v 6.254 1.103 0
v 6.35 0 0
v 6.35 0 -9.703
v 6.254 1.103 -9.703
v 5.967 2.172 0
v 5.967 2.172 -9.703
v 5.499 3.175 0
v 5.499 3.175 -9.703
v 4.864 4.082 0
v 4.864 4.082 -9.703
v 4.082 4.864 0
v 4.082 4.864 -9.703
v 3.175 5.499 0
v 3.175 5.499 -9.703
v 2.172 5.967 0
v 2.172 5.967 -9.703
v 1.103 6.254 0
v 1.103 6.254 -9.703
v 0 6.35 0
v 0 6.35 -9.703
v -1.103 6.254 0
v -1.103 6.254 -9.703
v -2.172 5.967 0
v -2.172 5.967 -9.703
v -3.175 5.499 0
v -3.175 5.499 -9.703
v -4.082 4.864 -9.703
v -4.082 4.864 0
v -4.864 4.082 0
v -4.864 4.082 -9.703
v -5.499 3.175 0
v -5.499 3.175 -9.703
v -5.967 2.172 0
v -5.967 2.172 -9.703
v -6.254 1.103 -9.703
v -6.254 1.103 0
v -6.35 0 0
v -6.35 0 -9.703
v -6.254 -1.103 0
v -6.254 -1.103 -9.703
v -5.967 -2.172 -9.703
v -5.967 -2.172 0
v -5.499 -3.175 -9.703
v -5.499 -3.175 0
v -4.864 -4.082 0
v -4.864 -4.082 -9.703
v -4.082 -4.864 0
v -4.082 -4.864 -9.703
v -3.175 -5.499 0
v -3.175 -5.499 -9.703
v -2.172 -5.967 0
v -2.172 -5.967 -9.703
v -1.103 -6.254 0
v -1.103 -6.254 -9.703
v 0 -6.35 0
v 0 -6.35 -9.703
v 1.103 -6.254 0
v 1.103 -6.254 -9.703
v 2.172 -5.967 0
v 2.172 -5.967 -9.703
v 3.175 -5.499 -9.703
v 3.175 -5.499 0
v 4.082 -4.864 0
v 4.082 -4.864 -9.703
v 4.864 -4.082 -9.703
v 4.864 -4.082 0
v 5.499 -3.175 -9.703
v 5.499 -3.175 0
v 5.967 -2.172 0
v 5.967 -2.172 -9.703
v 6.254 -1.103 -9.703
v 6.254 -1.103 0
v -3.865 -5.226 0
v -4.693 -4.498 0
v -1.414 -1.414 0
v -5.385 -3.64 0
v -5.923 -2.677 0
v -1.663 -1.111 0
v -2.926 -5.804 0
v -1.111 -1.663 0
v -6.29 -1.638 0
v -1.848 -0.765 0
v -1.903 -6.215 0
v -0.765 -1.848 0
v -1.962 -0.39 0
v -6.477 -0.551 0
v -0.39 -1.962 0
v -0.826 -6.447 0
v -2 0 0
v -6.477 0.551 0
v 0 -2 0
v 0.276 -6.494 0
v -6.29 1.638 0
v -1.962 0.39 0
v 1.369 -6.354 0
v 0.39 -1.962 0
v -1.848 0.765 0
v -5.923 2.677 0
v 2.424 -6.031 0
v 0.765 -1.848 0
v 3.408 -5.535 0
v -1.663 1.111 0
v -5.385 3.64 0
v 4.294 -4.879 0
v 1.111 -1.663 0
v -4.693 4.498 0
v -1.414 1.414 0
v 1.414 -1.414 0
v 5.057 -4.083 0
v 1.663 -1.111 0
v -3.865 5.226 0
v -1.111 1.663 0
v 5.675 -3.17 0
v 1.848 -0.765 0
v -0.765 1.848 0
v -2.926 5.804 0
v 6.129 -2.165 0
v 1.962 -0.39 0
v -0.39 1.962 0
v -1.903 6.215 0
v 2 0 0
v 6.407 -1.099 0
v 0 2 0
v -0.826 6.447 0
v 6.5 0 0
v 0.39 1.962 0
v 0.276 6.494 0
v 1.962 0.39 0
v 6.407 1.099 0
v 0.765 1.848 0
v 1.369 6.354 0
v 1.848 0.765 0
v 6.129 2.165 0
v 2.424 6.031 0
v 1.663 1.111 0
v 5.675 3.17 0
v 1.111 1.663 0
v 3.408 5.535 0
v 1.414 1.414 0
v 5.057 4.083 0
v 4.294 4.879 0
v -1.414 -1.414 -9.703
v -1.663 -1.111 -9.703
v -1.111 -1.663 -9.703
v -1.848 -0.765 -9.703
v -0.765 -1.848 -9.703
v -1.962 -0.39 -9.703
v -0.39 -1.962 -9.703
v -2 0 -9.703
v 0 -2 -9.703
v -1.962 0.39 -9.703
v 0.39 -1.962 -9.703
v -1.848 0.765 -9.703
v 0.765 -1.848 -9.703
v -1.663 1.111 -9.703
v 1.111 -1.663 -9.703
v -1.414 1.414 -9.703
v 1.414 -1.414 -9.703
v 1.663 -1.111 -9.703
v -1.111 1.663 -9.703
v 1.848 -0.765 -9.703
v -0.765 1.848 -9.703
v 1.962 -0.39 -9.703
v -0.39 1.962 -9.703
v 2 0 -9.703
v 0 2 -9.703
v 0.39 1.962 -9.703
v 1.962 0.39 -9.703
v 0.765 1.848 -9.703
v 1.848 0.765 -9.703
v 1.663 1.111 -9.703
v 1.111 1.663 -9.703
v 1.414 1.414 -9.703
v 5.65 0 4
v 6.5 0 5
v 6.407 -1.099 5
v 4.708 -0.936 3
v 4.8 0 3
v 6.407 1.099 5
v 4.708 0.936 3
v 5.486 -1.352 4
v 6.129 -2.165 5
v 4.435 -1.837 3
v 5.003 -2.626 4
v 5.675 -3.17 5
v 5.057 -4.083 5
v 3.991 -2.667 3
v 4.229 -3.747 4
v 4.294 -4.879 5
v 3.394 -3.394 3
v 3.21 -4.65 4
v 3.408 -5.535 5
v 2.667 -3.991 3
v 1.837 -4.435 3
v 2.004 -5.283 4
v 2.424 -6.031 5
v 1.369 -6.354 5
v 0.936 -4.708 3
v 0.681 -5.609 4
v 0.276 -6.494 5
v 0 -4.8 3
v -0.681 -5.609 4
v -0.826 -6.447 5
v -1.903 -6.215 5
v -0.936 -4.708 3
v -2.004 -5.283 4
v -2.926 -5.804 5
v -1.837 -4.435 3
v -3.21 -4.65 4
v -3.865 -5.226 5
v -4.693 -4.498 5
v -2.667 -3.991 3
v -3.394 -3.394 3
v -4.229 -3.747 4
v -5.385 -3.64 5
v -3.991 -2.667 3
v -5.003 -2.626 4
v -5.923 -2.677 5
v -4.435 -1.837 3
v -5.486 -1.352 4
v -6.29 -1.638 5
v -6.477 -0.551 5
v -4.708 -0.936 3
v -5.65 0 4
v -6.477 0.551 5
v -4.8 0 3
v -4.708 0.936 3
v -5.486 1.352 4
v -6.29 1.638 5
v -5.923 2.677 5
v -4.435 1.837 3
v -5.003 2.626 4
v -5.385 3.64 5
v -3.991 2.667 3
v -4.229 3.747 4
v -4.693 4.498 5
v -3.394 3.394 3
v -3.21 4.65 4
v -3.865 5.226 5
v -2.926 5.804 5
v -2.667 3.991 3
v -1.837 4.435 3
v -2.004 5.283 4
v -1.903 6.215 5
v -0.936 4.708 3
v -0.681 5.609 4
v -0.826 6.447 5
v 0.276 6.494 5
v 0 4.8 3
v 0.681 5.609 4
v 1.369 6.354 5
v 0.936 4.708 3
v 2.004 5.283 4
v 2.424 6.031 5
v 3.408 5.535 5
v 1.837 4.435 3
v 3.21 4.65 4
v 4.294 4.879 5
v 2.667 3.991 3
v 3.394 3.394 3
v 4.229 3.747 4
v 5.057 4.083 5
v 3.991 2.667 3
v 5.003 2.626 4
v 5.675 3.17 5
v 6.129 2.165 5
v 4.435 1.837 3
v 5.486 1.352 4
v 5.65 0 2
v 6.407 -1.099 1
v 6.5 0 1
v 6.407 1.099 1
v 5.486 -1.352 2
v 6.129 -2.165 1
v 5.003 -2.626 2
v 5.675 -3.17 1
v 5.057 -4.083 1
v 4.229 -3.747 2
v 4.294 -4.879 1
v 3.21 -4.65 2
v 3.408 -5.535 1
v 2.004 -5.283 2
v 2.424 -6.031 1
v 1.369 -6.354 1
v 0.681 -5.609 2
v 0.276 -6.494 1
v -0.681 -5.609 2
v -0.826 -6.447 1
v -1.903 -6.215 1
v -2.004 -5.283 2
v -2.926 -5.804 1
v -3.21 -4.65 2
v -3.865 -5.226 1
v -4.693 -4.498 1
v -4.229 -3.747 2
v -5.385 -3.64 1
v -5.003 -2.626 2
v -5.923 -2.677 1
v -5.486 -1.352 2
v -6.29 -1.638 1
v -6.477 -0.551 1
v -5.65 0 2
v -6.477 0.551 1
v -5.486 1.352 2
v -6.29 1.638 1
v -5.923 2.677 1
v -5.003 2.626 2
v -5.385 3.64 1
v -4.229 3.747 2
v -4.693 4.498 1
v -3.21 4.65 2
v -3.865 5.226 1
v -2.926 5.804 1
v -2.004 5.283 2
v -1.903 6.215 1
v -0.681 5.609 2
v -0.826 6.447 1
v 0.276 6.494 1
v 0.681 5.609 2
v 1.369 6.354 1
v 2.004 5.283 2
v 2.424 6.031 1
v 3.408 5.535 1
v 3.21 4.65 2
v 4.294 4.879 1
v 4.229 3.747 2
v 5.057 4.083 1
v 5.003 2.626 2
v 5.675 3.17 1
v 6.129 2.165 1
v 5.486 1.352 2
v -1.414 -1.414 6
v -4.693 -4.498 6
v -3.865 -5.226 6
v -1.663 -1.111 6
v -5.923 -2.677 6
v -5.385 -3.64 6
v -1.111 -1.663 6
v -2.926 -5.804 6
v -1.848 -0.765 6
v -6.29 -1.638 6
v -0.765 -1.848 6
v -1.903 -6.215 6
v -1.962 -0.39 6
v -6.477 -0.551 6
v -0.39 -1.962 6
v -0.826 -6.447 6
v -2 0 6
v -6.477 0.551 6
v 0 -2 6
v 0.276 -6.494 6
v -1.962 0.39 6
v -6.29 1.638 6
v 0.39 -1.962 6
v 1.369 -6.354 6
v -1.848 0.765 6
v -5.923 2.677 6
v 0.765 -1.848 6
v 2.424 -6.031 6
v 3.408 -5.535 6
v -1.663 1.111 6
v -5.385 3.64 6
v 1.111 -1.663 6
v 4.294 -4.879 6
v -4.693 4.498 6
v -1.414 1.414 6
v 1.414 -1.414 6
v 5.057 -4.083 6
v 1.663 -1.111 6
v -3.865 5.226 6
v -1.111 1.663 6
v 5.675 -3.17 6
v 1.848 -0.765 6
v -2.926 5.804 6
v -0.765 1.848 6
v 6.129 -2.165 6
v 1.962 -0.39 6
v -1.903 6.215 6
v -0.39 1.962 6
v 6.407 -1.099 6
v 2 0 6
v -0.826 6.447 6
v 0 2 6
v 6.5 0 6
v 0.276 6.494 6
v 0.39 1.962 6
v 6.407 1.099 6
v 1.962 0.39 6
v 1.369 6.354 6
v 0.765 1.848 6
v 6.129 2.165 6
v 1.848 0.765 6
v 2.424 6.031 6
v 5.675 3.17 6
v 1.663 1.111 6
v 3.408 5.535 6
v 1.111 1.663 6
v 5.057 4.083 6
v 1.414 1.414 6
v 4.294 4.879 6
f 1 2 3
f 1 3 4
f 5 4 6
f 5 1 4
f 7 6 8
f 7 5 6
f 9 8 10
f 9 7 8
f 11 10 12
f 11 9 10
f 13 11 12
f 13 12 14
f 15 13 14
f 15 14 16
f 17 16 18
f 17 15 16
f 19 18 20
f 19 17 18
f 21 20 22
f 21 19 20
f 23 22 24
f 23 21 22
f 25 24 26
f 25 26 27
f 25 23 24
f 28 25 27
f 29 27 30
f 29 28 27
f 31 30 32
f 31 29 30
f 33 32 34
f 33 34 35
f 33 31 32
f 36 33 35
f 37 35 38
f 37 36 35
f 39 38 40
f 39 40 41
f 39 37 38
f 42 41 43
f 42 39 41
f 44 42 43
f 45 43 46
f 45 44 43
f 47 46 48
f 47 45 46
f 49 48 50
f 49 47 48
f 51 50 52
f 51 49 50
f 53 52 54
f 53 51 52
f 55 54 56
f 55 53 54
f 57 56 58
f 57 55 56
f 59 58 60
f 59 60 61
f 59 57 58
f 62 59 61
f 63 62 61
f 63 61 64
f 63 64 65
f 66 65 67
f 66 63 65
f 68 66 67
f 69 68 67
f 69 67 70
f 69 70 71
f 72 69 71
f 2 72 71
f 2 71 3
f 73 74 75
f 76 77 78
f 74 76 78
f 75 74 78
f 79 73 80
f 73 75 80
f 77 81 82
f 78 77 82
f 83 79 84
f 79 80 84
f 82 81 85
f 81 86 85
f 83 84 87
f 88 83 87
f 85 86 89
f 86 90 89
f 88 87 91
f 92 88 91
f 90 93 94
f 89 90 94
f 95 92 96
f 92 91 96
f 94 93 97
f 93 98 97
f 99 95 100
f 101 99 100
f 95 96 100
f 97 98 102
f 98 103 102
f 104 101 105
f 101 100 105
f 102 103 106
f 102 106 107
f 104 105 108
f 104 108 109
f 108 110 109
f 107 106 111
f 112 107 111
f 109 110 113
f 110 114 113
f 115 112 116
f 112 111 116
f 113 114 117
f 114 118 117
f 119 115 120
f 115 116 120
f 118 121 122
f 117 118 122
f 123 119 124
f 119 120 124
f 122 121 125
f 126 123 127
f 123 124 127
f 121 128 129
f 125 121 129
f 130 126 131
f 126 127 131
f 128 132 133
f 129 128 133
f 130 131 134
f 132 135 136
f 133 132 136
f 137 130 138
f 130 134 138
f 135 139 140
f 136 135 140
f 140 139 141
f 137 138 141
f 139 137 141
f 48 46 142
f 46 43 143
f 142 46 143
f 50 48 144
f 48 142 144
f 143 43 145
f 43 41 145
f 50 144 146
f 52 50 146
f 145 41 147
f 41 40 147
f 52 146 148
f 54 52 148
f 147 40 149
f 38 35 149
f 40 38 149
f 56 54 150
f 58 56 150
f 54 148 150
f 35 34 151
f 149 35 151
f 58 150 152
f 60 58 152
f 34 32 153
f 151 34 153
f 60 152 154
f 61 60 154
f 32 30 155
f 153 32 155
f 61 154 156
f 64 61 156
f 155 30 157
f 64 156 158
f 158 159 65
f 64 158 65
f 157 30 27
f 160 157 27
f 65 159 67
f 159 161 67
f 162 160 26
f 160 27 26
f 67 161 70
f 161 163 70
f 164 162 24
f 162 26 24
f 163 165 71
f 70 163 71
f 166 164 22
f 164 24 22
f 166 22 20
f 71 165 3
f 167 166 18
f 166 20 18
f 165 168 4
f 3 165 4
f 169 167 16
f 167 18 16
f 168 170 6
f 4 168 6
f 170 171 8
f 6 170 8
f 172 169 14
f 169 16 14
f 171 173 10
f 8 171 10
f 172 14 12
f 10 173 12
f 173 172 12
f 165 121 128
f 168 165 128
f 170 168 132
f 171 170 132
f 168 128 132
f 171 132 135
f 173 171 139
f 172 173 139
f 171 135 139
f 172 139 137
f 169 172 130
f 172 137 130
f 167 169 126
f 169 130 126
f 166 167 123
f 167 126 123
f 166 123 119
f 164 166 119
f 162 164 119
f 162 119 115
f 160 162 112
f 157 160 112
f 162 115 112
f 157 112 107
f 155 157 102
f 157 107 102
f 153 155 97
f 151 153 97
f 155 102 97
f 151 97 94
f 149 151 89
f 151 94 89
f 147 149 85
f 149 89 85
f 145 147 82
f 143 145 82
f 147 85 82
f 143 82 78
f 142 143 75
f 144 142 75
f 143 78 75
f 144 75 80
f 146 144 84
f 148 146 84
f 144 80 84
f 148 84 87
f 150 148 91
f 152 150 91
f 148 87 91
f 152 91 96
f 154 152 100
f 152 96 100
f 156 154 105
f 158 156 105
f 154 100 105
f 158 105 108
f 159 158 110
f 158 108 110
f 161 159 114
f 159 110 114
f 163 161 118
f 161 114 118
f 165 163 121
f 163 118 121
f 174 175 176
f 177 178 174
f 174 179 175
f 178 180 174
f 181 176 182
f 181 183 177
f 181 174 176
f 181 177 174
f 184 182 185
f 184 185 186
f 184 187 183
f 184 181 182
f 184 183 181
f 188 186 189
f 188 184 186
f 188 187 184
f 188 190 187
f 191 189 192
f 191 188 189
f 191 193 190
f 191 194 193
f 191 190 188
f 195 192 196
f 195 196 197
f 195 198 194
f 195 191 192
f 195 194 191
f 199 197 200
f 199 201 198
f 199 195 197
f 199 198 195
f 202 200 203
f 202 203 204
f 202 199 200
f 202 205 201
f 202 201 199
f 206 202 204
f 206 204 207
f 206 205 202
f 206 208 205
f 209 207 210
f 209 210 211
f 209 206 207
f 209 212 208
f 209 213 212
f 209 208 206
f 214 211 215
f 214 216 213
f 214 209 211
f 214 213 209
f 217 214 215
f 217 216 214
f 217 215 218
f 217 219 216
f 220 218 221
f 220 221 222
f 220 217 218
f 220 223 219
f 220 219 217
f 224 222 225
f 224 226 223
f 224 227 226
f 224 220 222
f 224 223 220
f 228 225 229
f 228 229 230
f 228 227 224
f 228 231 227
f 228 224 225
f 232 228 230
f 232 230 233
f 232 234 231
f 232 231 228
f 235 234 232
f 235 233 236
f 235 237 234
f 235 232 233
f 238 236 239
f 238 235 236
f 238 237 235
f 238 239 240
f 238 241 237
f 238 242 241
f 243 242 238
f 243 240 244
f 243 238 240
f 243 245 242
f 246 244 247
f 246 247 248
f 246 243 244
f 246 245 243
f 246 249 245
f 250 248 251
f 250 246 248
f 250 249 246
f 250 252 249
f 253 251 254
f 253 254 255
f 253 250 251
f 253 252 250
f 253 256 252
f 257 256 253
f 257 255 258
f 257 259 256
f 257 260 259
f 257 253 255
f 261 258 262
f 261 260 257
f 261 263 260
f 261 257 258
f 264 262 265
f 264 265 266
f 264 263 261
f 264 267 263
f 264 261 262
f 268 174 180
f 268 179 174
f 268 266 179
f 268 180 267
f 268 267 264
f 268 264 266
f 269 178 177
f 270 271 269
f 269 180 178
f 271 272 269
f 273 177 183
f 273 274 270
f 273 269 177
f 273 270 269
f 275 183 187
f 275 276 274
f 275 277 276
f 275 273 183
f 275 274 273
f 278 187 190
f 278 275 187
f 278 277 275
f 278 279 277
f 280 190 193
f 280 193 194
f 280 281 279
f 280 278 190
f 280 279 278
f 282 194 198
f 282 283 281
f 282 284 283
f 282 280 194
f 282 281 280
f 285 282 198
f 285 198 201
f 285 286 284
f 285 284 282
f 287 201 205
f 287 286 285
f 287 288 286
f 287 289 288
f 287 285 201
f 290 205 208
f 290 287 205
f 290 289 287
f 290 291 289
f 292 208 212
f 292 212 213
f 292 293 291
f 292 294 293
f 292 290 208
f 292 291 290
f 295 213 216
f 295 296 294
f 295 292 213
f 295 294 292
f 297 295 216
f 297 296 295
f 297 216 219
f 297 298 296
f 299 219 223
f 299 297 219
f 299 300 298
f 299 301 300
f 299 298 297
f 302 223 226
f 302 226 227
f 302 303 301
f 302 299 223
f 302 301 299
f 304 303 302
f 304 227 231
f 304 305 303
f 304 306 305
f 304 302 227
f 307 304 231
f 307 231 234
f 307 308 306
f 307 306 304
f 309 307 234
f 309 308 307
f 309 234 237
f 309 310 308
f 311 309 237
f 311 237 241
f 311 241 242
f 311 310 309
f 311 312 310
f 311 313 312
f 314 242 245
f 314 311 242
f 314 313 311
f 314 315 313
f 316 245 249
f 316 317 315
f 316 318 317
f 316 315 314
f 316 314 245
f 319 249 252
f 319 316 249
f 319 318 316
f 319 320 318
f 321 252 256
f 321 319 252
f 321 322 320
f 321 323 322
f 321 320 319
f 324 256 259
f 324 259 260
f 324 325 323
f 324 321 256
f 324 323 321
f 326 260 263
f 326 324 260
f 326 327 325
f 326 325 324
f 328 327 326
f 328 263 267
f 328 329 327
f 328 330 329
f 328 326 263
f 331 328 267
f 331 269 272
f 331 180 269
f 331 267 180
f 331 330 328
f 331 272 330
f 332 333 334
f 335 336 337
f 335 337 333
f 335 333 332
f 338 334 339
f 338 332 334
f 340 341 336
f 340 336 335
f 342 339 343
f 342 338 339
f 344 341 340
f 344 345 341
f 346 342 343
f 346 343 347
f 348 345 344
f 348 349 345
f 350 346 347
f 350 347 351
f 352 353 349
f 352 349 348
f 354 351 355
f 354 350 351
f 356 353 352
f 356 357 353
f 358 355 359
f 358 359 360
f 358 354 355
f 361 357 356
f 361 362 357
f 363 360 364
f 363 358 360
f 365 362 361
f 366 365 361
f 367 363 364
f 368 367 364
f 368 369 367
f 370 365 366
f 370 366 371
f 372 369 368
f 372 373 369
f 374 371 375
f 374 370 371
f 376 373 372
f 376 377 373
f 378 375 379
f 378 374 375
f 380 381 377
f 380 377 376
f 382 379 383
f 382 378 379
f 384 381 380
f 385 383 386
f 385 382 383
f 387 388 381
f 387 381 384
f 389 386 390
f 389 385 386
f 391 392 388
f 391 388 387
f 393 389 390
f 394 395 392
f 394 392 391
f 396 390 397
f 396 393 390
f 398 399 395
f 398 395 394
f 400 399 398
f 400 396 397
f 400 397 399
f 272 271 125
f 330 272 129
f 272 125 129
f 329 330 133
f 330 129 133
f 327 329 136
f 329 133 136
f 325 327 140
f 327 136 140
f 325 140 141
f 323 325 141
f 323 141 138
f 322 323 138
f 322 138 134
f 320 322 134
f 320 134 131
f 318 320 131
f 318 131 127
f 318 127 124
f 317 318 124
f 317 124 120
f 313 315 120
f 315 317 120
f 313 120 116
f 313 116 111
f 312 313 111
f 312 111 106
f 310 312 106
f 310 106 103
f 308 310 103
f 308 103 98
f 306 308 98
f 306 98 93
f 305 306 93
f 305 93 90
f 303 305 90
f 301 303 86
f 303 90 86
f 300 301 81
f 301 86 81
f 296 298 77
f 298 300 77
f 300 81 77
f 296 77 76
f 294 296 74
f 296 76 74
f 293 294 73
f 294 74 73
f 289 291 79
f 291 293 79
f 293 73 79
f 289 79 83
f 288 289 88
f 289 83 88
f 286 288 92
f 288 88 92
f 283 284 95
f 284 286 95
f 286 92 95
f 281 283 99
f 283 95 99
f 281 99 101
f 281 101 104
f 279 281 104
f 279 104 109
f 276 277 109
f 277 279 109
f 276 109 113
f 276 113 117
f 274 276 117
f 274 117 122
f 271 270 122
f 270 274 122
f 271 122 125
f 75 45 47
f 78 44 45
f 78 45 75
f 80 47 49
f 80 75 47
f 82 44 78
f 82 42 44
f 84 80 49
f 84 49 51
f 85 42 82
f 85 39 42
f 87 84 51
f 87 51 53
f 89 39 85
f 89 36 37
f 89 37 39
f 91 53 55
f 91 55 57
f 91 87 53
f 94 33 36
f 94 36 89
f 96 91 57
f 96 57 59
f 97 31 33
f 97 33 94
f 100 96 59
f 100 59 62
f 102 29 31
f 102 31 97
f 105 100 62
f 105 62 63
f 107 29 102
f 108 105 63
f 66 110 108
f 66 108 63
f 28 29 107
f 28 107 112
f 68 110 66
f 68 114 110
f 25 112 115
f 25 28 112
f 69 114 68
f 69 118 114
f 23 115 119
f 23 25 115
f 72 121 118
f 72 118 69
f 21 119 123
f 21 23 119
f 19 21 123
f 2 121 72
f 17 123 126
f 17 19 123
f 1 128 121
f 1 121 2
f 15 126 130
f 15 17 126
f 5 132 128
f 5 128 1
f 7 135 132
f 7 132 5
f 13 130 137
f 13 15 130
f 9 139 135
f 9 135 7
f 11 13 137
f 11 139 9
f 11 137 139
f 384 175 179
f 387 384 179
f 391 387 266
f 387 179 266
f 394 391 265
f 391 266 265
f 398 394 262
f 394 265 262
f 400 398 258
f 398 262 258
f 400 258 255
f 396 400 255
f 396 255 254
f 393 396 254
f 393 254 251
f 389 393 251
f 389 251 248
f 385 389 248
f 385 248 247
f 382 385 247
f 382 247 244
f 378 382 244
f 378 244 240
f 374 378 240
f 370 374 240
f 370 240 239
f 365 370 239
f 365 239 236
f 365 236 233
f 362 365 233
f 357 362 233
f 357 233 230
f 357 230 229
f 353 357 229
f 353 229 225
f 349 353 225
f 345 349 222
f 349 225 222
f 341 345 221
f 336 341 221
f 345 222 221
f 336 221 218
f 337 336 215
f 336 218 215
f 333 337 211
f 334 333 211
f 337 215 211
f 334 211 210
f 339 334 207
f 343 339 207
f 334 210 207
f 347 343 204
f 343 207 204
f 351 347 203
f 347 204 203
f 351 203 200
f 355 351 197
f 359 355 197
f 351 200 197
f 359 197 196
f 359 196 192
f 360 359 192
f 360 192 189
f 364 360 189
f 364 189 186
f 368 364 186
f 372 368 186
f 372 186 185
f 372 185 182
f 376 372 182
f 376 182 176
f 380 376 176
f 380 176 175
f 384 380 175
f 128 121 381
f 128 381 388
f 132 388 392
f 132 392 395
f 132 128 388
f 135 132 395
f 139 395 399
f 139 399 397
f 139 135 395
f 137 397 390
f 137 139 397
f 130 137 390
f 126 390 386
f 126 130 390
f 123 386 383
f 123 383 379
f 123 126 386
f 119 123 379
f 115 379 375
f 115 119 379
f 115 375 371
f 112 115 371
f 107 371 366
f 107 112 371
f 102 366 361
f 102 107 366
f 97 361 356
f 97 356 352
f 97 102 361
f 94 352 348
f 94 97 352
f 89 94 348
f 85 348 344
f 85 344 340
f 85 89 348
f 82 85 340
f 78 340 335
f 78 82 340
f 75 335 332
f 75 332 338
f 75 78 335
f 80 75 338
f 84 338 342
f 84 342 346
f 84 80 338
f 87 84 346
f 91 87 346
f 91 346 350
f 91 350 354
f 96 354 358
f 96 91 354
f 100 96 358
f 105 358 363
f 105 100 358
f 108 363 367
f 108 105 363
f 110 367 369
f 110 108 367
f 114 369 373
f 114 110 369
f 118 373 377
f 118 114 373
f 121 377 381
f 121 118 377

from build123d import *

# Parameters (mm, degrees)
F0_R     = 6.5
F0_R_2   = 2
F1_DEPTH = 6
F4_R     = 6.35
F4_R_2   = 2
F5_DEPTH = 9.7028


with BuildPart() as f1:
    # F0 (on Top) → F1 (new body)
    with BuildSketch(Plane.XY):
        Circle(F0_R)
        Circle(F0_R_2, mode=Mode.SUBTRACT)
    extrude(amount=F1_DEPTH)

    # F2 (on Front) → F3 (revolve, cut)
    with BuildSketch(Plane.XZ):
        Polygon((6.5, 1), (6.5, 5), (4.8, 3), align=None)
    revolve(axis=Axis((0, 0, 0), (0, 0, -1)), mode=Mode.SUBTRACT)


with BuildPart() as f5:
    # F4 (on Top) → F5 (new body)
    with BuildSketch(Plane.XY):
        Circle(F4_R)
        Circle(F4_R_2, mode=Mode.SUBTRACT)
    extrude(amount=-F5_DEPTH)


solid = Compound([f1.part, f5.part])
